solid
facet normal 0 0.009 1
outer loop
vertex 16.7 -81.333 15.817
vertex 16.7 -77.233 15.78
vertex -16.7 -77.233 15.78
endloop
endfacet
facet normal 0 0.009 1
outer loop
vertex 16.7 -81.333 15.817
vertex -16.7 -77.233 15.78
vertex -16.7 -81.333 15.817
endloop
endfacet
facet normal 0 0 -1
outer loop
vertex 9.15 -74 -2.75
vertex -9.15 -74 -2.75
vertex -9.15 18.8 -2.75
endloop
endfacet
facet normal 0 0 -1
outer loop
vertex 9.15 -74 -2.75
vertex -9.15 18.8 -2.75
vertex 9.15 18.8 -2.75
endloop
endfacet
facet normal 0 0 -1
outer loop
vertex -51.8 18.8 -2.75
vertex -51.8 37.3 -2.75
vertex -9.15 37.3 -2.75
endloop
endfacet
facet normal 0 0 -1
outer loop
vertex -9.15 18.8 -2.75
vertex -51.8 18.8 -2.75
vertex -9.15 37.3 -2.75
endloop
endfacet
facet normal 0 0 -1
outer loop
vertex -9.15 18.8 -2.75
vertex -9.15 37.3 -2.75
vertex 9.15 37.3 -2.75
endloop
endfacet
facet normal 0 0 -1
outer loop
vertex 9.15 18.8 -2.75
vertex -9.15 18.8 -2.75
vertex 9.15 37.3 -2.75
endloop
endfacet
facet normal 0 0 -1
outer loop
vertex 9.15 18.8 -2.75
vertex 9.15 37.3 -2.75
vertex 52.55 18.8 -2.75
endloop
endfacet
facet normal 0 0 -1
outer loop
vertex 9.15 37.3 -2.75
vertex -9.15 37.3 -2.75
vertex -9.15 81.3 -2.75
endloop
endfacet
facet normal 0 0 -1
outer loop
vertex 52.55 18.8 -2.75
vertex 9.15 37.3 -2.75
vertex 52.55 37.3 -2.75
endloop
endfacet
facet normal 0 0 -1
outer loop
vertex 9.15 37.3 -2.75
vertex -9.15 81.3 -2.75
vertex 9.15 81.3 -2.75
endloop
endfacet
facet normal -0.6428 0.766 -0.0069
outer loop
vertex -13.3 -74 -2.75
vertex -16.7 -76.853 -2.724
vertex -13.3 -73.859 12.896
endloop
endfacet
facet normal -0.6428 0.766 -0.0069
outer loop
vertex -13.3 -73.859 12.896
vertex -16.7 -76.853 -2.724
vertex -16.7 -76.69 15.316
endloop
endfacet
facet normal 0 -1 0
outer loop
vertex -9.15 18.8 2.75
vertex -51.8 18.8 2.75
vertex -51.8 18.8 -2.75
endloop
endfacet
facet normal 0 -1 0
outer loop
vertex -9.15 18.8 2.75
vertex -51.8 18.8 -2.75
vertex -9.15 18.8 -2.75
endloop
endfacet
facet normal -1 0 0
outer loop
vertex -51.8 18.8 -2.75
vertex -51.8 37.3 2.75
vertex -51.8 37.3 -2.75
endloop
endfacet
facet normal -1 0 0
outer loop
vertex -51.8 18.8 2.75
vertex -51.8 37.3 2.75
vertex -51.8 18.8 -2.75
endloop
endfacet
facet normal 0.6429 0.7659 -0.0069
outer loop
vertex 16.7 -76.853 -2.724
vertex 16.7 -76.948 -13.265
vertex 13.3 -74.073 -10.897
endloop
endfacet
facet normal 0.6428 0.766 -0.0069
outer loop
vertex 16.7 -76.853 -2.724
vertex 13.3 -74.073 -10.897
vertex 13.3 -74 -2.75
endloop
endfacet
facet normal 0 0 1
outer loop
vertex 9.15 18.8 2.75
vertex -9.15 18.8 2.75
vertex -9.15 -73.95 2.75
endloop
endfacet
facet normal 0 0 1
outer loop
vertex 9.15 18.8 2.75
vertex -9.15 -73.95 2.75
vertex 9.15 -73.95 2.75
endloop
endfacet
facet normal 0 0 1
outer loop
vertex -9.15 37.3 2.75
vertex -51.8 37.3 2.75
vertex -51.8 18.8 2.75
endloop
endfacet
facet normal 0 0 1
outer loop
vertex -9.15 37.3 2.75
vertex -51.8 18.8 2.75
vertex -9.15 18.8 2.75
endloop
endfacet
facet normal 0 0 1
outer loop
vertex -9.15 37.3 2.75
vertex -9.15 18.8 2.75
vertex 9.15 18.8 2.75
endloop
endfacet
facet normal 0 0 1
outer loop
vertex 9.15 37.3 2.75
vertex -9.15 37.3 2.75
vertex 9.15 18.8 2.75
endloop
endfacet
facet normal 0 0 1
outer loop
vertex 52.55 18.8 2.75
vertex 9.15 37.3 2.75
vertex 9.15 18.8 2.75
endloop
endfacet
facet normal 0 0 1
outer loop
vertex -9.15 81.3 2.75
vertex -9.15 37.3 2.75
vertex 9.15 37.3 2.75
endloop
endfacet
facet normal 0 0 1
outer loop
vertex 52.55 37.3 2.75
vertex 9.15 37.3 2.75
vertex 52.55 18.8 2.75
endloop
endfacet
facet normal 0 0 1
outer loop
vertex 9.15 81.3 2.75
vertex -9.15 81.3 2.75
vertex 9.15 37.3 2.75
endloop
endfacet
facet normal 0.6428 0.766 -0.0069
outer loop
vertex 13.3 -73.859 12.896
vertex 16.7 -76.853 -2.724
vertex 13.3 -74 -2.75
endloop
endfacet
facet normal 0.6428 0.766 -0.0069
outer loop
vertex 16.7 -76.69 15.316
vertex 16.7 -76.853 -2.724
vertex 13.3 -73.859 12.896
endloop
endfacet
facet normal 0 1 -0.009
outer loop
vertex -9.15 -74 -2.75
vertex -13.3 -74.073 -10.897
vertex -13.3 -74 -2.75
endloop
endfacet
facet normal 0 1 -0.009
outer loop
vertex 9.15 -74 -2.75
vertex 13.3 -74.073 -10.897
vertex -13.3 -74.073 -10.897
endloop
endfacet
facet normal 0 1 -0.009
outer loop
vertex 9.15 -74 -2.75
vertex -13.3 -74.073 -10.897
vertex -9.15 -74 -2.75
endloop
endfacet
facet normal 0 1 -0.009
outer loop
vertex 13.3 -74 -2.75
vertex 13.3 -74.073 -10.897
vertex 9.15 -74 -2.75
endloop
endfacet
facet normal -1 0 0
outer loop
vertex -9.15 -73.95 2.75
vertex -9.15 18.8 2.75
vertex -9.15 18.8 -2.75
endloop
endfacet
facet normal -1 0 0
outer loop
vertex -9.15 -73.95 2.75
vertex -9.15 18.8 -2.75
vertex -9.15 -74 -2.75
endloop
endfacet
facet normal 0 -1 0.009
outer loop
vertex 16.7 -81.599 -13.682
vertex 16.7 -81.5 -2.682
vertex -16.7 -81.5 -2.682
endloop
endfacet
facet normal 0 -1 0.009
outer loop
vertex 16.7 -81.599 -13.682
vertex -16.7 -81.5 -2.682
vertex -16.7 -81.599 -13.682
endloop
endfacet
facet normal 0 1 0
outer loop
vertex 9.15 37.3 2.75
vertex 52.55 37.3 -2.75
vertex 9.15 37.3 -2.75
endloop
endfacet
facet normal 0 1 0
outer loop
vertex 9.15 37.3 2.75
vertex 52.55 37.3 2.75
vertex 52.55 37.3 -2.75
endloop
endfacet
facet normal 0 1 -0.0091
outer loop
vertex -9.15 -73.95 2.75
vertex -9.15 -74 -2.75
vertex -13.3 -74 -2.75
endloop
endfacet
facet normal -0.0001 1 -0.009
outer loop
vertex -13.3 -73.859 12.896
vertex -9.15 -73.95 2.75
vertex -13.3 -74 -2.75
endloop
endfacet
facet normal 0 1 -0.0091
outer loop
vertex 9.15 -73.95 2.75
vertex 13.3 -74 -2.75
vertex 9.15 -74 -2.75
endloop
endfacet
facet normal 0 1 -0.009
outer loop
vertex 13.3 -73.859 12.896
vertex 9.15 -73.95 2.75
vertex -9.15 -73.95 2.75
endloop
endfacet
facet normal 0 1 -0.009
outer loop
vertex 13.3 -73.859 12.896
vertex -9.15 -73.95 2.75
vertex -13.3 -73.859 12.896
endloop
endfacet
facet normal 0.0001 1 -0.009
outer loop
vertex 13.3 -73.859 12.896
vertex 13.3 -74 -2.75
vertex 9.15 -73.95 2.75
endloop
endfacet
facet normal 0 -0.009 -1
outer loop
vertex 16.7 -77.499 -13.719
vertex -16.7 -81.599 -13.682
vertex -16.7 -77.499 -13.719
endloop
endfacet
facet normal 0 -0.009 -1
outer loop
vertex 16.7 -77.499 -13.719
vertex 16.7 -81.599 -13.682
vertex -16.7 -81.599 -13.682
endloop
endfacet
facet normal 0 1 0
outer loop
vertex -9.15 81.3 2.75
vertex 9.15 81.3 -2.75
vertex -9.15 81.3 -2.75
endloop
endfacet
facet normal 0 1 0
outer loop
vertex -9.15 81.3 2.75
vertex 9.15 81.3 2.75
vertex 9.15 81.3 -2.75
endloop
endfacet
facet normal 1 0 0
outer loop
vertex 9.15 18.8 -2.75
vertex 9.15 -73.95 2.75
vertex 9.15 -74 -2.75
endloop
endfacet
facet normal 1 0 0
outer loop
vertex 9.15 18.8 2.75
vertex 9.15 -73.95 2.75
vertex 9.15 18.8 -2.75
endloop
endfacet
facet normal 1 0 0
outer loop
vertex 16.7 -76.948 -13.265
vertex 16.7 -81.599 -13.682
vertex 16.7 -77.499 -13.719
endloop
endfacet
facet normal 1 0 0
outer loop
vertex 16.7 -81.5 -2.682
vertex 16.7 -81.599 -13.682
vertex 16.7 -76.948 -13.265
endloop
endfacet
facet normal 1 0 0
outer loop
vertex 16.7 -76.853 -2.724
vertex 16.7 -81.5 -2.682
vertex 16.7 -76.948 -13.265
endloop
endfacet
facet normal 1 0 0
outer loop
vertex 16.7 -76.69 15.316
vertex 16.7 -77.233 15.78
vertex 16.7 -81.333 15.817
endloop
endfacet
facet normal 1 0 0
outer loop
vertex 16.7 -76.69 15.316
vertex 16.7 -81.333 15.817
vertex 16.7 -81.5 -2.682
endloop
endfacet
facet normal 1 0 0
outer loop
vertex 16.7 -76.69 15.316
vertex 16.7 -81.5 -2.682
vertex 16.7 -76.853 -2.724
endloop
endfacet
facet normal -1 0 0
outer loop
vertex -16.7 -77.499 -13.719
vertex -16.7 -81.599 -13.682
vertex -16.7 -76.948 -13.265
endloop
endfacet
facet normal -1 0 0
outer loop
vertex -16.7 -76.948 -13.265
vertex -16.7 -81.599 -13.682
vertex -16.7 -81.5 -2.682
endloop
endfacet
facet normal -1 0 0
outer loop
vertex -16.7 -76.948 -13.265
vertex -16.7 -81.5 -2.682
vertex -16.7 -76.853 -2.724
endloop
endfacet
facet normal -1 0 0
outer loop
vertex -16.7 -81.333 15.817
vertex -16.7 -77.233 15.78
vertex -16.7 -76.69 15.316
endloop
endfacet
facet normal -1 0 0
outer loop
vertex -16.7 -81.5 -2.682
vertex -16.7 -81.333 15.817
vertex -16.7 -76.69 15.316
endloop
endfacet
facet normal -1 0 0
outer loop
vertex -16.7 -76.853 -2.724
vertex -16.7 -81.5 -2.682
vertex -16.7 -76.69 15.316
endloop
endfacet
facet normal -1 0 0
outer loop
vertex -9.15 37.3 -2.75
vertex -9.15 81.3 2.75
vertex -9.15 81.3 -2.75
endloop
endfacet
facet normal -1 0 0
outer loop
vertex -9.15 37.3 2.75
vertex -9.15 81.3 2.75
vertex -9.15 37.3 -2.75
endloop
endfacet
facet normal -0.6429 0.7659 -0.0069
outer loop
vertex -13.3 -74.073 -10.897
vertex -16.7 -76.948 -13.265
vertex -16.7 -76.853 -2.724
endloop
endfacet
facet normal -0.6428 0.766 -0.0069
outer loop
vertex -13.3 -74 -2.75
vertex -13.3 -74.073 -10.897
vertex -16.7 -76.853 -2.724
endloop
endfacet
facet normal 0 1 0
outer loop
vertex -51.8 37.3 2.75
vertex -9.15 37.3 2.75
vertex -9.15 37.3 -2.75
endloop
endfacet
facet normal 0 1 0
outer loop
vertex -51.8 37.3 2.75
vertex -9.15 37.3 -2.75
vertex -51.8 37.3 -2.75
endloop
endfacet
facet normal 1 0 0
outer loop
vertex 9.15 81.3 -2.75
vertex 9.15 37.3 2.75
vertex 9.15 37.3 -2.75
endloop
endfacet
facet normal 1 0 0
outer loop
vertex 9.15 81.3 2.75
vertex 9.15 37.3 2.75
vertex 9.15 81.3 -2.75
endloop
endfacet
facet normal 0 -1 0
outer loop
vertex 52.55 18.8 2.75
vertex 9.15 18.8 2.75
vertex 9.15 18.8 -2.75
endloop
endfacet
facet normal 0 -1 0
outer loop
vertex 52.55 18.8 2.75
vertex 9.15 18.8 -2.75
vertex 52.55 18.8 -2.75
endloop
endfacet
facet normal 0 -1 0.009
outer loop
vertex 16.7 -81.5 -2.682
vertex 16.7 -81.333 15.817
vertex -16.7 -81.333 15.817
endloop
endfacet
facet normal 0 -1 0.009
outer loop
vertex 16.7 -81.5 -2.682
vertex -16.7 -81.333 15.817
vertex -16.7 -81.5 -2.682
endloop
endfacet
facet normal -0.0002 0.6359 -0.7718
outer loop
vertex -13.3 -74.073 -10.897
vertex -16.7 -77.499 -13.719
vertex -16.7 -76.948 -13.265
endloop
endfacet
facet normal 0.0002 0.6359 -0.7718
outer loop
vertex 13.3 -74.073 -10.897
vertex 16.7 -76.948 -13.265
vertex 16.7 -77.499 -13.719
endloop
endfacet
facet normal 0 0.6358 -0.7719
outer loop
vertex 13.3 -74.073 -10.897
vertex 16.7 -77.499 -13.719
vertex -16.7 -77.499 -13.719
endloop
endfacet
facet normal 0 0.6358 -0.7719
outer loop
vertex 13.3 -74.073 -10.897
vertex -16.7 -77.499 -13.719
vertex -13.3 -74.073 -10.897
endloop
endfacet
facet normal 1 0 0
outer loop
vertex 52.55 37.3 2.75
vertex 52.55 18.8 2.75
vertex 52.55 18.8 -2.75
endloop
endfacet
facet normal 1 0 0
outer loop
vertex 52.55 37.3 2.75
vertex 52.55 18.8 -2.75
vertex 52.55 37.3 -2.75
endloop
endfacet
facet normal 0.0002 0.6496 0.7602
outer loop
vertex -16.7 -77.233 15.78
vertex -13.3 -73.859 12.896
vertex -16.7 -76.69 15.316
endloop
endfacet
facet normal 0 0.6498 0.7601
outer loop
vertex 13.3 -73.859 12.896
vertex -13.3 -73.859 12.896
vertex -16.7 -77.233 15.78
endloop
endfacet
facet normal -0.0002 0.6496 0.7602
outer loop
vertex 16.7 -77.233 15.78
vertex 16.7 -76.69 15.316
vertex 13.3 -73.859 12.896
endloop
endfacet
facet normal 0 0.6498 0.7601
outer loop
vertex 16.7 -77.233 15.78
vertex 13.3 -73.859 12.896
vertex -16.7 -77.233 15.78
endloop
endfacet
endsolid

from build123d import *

# Parameters (mm, degrees)
F1_DEPTH    = 2.75
F3_DEPTH    = 16.7
F4_C1_SIZE2 = 2.852938746
F4_C1_SIZE  = 3.4
F4_C2_SIZE2 = 2.852938746
F4_C2_SIZE  = 3.4


with BuildPart() as f1:
    # F0 (on Top) → F1 (new body, symmetric)
    with BuildSketch(Plane.XY):
        Polygon((9.15, 81.3), (0, 81.3), (-9.15, 81.3), (-9.15, 37.3), (-51.8, 37.3), (-51.8, 18.8), (-9.15, 18.8), (-9.15, -81.2), (0, -81.2), (9.15, -81.2), (9.15, 18.8), (52.55, 18.8), (52.55, 37.3), (9.15, 37.3), align=None)
    extrude(amount=F1_DEPTH, both=True)

    # F2 (on Right) → F3 (join, symmetric)
    with BuildSketch(Plane.YZ):
        Polygon((-74.0734412255, -10.8967302314), (-74, -2.75), (-73.8589504462, 12.8964254994), (-77.2330946452, 15.7798974367), (-81.3329280584, 15.8168566562), (-81.4996952681, -2.6823916718), (-81.5988541495, -13.6819447316), (-77.4990207363, -13.718903951), align=None)
    extrude(amount=F3_DEPTH, both=True)

    # F4: chamfer of 3.4 x 2.852938746 on 2 edges, made by hand

    # F4_c1
    f4_c1_edges = [f1.edges().sort_by_distance(p)[0] for p in [
        (-16.7, -73.9661958359, 0.999847634),
    ]]
    f4_c1_side = f1.faces().sort_by_distance((-16.6429412251, -73.9661958359, 0.999847634))[0]
    chamfer(f4_c1_edges, length=F4_C1_SIZE, length2=F4_C1_SIZE2, reference=f4_c1_side)

    # F4_c2
    f4_c2_edges = [f1.edges().sort_by_distance(p)[0] for p in [
        (16.7, -73.9661958359, 0.999847634),
    ]]
    f4_c2_side = f1.faces().sort_by_distance((16.6429412251, -73.9661958359, 0.999847634))[0]
    chamfer(f4_c2_edges, length=F4_C2_SIZE, length2=F4_C2_SIZE2, reference=f4_c2_side)


solid = f1.part
